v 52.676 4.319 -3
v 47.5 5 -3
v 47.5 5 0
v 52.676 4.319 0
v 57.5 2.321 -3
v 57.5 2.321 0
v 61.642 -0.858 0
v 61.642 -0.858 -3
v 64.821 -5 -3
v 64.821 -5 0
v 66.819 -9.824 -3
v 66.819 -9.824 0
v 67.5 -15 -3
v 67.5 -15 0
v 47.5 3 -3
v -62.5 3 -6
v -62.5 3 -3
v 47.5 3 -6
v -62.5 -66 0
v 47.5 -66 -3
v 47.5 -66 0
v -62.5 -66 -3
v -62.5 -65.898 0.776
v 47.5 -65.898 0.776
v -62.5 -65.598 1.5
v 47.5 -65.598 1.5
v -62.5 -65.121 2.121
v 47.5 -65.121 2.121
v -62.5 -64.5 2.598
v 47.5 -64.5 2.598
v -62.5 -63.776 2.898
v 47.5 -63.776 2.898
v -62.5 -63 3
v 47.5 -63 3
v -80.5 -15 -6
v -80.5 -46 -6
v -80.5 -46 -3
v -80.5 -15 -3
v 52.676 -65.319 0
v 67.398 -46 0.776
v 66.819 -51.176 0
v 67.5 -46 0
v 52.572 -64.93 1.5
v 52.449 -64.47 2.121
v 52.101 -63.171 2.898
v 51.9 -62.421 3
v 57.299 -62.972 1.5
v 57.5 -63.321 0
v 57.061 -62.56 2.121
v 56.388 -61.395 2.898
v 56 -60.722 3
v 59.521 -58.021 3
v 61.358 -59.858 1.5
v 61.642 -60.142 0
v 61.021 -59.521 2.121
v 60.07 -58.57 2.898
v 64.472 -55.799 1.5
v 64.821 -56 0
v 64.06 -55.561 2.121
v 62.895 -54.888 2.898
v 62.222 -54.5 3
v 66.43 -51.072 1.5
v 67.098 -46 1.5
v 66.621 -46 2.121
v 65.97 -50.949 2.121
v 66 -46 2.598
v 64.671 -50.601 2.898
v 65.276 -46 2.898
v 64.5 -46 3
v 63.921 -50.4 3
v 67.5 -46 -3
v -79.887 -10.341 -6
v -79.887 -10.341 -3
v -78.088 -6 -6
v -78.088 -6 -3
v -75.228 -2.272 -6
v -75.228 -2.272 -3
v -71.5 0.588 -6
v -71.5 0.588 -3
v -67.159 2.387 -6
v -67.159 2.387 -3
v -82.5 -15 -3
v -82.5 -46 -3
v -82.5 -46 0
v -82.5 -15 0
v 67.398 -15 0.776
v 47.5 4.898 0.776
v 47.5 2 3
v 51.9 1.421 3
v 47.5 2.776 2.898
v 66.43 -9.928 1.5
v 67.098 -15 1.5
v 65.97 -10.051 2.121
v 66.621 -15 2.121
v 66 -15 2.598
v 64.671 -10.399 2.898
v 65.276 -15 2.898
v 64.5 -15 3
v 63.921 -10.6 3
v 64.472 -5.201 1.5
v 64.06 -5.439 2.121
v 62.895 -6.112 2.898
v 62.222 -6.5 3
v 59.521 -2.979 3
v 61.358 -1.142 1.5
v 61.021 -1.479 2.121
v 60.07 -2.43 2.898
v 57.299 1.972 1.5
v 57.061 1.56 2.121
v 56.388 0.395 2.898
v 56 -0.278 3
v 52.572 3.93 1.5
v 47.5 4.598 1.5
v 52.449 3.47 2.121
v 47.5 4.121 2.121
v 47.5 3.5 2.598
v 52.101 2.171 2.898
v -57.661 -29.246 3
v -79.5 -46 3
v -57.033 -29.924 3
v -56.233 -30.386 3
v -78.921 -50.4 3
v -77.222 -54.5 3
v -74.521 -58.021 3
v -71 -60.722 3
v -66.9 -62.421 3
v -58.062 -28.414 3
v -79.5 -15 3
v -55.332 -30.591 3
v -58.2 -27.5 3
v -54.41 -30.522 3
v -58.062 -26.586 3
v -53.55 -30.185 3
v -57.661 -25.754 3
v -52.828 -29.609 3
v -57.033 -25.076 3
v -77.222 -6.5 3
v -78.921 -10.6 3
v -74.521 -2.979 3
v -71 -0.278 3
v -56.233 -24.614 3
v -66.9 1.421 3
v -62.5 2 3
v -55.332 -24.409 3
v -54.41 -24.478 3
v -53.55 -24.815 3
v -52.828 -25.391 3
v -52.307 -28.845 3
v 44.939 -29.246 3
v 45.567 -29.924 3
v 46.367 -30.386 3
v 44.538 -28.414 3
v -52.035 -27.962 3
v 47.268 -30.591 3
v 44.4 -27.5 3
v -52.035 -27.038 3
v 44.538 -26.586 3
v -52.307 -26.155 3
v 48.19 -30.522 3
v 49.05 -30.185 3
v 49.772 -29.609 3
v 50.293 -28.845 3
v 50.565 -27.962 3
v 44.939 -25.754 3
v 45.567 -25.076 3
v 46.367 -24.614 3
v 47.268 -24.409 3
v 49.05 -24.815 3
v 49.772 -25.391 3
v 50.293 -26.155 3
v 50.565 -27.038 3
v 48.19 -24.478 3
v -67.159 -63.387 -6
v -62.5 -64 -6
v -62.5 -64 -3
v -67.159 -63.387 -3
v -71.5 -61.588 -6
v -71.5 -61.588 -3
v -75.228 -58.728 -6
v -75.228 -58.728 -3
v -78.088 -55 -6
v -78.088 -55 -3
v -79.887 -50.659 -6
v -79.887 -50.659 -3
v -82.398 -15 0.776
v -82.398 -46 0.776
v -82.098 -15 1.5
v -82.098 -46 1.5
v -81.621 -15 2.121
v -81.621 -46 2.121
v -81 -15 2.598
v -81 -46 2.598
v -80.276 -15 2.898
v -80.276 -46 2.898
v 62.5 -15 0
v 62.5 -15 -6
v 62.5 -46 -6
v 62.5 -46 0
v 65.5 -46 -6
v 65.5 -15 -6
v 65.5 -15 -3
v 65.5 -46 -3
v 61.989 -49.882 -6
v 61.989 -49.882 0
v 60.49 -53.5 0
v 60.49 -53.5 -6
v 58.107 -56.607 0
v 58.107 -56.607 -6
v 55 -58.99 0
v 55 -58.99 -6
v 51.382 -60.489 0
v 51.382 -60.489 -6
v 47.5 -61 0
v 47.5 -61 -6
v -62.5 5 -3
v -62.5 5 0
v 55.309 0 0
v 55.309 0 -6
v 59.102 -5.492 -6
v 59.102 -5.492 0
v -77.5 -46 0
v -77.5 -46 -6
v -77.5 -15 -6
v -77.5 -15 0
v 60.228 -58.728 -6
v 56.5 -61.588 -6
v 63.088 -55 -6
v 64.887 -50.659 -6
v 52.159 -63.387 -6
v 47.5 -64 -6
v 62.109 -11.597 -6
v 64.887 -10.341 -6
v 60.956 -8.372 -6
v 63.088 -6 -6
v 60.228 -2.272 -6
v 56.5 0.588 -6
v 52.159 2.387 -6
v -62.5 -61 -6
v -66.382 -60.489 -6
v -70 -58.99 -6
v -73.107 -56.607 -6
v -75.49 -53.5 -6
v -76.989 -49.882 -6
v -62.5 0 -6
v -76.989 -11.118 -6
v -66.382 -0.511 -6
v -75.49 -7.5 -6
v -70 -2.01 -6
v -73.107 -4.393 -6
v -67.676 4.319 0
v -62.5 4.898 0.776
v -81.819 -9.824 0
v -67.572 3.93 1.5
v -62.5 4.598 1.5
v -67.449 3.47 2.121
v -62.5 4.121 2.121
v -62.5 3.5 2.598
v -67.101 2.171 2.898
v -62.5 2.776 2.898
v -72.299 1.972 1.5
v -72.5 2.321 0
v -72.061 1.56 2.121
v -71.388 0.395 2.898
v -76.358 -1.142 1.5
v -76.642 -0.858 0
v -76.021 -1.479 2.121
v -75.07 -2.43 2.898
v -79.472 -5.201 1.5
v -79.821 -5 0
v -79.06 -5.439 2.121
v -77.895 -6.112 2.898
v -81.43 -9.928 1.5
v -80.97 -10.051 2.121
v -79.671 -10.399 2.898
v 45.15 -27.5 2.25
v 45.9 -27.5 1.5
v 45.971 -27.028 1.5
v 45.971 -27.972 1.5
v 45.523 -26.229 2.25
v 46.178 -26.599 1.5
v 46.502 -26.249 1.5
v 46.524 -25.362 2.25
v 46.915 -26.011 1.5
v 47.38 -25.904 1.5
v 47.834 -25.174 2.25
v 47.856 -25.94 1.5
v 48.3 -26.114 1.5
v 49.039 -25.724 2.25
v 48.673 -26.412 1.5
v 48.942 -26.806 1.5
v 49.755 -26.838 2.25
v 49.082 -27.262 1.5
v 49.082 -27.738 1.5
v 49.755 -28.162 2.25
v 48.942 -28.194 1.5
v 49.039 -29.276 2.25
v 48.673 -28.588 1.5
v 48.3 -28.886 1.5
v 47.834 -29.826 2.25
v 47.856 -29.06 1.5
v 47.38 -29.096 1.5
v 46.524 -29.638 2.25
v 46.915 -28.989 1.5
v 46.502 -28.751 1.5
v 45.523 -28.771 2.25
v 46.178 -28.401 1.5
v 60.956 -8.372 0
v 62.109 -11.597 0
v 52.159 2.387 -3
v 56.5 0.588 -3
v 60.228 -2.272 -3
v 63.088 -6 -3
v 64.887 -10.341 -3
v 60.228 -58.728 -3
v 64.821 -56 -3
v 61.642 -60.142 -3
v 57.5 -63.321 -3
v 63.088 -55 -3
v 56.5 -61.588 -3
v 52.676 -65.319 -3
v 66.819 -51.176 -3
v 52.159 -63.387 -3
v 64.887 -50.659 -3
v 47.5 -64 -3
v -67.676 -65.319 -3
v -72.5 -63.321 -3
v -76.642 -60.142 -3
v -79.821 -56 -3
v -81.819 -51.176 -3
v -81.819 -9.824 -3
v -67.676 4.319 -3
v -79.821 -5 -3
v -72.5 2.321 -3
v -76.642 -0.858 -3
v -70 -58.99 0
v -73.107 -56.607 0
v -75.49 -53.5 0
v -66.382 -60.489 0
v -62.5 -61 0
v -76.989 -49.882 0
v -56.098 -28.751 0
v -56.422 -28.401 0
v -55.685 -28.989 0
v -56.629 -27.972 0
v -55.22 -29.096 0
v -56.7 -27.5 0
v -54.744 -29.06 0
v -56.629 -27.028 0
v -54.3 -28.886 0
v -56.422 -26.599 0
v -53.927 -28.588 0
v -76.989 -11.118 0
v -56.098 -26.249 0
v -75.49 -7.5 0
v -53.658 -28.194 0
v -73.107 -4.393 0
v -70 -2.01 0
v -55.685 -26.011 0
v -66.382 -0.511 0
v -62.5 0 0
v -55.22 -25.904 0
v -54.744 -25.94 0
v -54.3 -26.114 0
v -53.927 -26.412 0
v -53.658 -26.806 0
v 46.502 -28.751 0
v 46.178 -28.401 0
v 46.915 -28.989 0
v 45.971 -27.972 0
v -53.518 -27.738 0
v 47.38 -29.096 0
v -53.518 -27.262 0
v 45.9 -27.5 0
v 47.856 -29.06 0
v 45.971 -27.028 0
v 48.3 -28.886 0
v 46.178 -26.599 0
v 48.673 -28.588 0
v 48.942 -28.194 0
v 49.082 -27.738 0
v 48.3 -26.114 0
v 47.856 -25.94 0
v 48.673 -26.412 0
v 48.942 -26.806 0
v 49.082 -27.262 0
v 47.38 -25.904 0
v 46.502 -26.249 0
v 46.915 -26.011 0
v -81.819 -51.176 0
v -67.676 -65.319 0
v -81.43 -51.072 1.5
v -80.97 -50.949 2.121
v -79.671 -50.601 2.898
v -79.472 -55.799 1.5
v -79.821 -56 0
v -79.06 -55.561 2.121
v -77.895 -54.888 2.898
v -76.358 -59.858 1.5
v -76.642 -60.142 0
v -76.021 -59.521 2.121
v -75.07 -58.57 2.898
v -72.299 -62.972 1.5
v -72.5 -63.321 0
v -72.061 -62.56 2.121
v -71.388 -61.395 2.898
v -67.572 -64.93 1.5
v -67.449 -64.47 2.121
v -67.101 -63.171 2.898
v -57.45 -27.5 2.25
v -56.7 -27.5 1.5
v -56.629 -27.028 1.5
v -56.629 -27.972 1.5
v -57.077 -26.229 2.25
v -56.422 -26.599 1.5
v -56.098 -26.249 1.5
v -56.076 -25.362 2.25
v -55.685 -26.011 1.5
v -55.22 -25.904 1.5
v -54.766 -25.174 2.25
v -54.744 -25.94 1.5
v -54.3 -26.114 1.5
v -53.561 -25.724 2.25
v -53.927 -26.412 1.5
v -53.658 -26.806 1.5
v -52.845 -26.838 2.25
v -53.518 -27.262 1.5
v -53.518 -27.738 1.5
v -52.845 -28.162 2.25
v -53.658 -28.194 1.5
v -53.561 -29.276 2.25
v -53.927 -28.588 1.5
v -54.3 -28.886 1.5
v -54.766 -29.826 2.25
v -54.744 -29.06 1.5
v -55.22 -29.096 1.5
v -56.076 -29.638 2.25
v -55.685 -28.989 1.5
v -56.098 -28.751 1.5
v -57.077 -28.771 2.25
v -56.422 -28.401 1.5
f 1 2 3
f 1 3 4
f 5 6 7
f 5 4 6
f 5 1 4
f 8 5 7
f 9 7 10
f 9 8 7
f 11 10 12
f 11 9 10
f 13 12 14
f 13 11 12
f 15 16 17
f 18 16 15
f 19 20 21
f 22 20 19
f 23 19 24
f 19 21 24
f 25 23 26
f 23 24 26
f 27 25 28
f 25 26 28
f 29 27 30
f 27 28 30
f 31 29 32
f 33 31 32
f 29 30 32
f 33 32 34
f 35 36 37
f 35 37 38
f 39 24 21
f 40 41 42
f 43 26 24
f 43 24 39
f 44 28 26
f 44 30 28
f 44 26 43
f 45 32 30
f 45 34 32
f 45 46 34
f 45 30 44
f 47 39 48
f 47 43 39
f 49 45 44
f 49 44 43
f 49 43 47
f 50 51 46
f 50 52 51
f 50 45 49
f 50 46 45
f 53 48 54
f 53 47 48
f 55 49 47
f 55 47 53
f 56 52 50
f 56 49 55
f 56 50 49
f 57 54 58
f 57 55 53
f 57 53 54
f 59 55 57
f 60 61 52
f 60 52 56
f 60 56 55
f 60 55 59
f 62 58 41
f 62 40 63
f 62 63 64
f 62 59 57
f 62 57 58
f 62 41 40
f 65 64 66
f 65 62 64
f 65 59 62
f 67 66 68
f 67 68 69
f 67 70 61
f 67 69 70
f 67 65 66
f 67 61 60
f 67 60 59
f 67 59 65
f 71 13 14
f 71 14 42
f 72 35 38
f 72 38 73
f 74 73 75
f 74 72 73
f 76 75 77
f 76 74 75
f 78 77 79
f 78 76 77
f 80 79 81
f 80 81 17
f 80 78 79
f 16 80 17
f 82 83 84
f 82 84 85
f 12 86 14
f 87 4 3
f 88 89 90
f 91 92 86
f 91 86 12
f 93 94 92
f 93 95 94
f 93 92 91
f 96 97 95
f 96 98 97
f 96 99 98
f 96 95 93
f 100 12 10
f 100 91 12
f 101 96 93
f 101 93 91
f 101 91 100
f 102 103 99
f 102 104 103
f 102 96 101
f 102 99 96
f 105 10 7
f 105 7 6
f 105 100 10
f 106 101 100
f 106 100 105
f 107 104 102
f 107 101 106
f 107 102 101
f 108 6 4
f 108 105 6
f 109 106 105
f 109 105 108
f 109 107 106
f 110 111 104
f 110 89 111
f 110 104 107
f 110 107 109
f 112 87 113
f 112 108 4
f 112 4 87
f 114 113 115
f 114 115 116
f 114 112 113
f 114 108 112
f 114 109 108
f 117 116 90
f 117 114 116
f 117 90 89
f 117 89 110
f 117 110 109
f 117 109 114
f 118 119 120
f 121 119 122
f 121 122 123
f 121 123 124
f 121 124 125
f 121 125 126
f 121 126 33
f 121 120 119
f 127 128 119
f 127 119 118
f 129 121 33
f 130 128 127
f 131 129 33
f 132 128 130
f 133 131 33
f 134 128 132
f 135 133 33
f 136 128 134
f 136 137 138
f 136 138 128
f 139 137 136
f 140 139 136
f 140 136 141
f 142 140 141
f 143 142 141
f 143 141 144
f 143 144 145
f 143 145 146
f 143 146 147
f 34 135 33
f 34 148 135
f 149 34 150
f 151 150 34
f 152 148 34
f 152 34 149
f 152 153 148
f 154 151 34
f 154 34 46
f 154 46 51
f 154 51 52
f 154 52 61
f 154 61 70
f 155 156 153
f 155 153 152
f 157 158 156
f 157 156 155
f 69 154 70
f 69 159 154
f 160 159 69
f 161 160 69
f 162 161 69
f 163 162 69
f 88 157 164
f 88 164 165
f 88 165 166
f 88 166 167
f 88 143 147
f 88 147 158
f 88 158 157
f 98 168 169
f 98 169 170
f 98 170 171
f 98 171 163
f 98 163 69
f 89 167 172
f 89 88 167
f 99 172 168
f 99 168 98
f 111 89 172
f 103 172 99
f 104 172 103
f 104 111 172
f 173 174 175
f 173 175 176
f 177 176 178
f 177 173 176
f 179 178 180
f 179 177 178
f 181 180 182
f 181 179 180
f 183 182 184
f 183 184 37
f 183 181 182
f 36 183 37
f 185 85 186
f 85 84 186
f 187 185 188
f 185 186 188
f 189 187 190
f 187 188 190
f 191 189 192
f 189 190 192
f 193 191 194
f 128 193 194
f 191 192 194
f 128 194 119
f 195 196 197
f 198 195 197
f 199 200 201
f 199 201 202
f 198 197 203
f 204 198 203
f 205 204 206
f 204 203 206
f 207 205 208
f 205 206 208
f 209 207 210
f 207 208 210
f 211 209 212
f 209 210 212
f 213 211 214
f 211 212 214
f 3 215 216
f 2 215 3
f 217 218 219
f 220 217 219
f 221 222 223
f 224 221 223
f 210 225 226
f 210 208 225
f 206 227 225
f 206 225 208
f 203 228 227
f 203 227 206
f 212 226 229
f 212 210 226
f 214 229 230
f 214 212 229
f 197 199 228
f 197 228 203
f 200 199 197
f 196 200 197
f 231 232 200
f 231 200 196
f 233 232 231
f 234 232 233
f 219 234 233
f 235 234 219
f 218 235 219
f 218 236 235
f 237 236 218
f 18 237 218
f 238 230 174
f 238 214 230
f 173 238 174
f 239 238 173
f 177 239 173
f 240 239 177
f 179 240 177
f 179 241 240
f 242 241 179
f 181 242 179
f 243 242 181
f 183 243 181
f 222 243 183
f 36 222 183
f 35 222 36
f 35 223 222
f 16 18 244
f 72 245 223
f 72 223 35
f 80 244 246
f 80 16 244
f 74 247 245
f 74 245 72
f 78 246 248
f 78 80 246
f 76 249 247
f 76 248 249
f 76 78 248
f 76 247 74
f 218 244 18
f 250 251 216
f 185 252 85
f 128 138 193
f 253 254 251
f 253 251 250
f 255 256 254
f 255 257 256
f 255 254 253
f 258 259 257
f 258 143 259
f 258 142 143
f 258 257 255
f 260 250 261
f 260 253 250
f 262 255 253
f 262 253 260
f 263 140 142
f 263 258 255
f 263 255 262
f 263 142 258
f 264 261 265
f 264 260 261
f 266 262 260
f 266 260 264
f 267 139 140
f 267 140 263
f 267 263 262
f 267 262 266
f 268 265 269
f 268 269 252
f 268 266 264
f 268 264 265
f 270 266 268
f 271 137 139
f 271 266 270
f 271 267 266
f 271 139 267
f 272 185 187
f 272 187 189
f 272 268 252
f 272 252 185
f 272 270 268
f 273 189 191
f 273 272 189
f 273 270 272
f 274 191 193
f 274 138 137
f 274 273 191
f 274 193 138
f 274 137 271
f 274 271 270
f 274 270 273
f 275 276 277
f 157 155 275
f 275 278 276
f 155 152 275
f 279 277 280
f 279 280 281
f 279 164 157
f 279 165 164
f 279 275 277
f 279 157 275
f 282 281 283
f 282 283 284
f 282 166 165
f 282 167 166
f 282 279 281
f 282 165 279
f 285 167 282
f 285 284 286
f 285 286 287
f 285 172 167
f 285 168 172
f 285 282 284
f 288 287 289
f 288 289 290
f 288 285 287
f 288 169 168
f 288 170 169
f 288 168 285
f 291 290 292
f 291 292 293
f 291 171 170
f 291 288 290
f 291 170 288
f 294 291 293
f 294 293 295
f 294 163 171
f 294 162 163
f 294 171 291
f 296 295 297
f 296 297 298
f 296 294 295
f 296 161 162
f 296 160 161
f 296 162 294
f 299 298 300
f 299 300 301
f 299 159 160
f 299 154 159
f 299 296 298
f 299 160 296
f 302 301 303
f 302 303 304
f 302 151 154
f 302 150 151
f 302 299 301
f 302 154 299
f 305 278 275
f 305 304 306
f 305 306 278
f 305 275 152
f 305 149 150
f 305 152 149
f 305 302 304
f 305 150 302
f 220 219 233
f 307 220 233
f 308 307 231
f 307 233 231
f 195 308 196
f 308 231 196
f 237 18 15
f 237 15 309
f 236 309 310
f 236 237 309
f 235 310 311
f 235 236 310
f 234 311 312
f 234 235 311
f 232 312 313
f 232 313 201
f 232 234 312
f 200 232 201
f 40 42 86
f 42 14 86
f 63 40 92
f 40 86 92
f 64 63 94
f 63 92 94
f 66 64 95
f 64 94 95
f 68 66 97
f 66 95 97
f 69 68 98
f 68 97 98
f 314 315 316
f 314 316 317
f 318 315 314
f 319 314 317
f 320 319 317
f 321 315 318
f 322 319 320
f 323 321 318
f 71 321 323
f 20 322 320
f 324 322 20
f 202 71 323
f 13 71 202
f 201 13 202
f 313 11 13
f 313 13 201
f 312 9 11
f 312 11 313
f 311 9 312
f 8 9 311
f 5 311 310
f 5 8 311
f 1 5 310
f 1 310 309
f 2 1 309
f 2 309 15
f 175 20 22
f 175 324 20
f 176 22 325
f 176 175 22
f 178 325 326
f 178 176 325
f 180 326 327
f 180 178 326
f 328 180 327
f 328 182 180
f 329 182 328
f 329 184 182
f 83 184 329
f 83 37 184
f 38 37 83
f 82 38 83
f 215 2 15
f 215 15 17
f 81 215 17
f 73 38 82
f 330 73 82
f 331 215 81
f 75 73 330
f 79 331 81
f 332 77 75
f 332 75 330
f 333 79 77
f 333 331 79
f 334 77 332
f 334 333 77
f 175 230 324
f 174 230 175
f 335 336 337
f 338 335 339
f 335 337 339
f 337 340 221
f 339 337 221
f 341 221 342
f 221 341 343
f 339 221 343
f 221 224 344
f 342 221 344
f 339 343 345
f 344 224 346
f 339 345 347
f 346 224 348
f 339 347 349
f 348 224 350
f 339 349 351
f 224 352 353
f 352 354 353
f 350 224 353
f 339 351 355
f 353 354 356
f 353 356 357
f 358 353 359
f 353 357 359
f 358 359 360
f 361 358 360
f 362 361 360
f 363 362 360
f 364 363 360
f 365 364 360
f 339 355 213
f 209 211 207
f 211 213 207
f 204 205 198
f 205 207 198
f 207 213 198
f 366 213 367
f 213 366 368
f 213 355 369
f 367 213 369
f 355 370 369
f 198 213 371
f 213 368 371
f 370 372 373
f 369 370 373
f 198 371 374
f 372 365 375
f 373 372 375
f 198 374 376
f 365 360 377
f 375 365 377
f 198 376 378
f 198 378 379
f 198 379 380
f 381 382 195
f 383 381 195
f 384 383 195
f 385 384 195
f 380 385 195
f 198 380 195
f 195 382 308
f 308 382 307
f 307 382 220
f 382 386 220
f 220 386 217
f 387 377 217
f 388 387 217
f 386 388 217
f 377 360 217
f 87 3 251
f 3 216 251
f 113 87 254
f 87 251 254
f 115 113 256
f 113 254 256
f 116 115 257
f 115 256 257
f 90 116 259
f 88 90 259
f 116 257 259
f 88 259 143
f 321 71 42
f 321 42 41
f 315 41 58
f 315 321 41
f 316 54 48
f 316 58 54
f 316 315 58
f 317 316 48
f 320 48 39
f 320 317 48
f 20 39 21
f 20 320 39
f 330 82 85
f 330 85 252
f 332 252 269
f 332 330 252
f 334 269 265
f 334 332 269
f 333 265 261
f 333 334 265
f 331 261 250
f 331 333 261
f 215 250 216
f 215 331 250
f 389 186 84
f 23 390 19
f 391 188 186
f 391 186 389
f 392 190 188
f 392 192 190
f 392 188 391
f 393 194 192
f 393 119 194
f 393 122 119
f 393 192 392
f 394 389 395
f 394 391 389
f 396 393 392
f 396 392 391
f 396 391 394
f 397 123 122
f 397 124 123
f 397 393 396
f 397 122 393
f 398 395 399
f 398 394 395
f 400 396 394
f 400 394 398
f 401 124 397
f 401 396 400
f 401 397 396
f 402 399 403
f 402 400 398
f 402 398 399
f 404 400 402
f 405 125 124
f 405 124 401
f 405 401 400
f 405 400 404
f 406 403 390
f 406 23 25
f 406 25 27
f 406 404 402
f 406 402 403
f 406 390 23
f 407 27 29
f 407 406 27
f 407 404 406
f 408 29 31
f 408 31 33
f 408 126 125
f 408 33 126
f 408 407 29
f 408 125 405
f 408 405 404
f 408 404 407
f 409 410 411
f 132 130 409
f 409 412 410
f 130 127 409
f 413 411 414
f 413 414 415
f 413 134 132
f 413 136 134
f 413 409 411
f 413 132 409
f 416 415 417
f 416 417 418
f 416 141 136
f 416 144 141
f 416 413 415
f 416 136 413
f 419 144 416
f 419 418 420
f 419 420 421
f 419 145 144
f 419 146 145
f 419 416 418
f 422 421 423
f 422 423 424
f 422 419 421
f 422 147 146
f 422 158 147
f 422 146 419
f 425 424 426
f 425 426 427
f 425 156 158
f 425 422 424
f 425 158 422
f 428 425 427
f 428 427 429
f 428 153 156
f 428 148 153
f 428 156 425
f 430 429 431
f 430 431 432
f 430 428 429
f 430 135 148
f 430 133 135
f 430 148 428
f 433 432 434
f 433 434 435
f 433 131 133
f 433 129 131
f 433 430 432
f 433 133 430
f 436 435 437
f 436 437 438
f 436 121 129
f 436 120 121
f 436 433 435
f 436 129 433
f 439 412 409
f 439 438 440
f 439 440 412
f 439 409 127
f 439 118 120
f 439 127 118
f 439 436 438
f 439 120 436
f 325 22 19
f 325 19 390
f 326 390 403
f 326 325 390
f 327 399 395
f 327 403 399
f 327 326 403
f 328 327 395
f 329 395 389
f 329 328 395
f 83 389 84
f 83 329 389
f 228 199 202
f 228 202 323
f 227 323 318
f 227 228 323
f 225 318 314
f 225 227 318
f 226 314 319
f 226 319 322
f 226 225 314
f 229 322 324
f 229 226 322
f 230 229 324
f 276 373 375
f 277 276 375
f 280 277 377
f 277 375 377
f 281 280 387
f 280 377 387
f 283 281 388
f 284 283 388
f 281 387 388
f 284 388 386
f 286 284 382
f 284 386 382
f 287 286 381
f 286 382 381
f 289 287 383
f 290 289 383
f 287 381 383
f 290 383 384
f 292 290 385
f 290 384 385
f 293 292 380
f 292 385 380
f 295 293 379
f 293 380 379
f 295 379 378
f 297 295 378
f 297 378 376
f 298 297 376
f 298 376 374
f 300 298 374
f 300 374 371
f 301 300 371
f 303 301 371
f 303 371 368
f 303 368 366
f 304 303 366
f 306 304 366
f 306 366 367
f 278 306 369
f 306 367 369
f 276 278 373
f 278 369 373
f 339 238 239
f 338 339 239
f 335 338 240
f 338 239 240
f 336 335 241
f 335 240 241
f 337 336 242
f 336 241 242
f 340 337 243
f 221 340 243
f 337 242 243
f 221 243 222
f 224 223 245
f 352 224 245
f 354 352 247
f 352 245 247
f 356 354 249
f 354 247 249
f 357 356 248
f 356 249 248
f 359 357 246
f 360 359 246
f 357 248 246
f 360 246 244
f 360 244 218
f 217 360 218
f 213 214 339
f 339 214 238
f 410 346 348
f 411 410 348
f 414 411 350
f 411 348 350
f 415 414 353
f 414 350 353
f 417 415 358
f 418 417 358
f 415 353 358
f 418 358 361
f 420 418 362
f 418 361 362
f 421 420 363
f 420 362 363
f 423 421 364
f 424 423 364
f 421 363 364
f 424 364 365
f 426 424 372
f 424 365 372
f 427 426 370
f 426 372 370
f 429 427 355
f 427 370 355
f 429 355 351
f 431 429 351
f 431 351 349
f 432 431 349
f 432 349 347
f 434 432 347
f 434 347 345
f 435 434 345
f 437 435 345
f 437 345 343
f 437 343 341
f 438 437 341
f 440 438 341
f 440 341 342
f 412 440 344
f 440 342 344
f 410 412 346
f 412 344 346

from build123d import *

# Parameters (mm, degrees)
BOSS_EXTRUDE1_DEPTH = 3
BOSS_EXTRUDE2_START = 3
BOSS_EXTRUDE2_DEPTH = 3
FILLET1_R           = 3
BOSS_EXTRUDE3_START = 6
BOSS_EXTRUDE3_DEPTH = 6
SKETCH4_R           = 1.6
CUT_EXTRUDE1_DEPTH  = 3
CHAMFER1_SIZE       = 1.5
CUT_EXTRUDE2_DEPTH  = 6


with BuildPart() as part:
    # Sketch1 → Boss-Extrude1 (new body)
    with BuildSketch(Plane.XY):
        with BuildLine():
            Line((67.5, -46), (67.5, -15))
            ThreePointArc((67.5, -15), (61.642135624, -0.857864376), (47.5, 5))
            Line((47.5, 5), (-62.5, 5))
            ThreePointArc((-62.5, 5), (-76.642135624, -0.857864376), (-82.5, -15))
            Line((-82.5, -15), (-82.5, -46))
            ThreePointArc((-82.5, -46), (-76.642135624, -60.142135624), (-62.5, -66))
            Line((-62.5, -66), (47.5, -66))
            ThreePointArc((47.5, -66), (61.642135624, -60.142135624), (67.5, -46))
        make_face()
    extrude(amount=BOSS_EXTRUDE1_DEPTH)

    # Sketch2 → Boss-Extrude2 (add)
    with BuildSketch(Plane(origin=(0, 0, 0), x_dir=(-1, 0, 0), z_dir=(0, 0, -1)).offset(BOSS_EXTRUDE2_START)):
        with BuildLine():
            Line((-47.5, -66), (62.5, -66))
            ThreePointArc((62.5, -66), (76.642135624, -60.142135624), (82.5, -46))
            Line((82.5, -46), (82.5, -15))
            ThreePointArc((82.5, -15), (76.642135624, -0.857864376), (62.5, 5))
            Line((62.5, 5), (-47.5, 5))
            ThreePointArc((-47.5, 5), (-61.642135624, -0.857864376), (-67.5, -15))
            Line((-67.5, -15), (-67.5, -46))
            ThreePointArc((-67.5, -46), (-61.642135624, -60.142135624), (-47.5, -66))
        make_face()
        with BuildLine():
            Line((-47.5, -64), (62.5, -64))
            ThreePointArc((62.5, -64), (75.227922061, -58.727922061), (80.5, -46))
            Line((80.5, -46), (80.5, -15))
            ThreePointArc((80.5, -15), (75.227922061, -2.272077939), (62.5, 3))
            Line((62.5, 3), (-47.5, 3))
            ThreePointArc((-47.5, 3), (-60.227922061, -2.272077939), (-65.5, -15))
            Line((-65.5, -15), (-65.5, -46))
            ThreePointArc((-65.5, -46), (-60.227922061, -58.727922061), (-47.5, -64))
        make_face(mode=Mode.SUBTRACT)
    extrude(amount=-BOSS_EXTRUDE2_DEPTH)

    # Fillet1
    fillet1_edges = [part.edges().sort_by_distance(p)[0] for p in [
        (61.642135624, -0.857864376, 3),
        (-7.5, 5, 3),
        (-76.642135624, -0.857864376, 3),
        (-82.5, -30.5, 3),
        (-76.642135624, -60.142135624, 3),
        (-7.5, -66, 3),
        (61.642135624, -60.142135624, 3),
        (67.5, -30.5, 3),
    ]]
    fillet(fillet1_edges, radius=FILLET1_R)

    # Sketch3 → Boss-Extrude3 (add)
    with BuildSketch(Plane(origin=(0, 0, 0), x_dir=(-1, 0, 0), z_dir=(0, 0, -1)).offset(BOSS_EXTRUDE3_START)):
        with BuildLine():
            Line((-65.5, -15), (-65.5, -46))
            ThreePointArc((-65.5, -46), (-60.227922061, -58.727922061), (-47.5, -64))
            Line((-47.5, -64), (62.5, -64))
            ThreePointArc((62.5, -64), (75.227922061, -58.727922061), (80.5, -46))
            Line((80.5, -46), (80.5, -15))
            ThreePointArc((80.5, -15), (75.227922061, -2.272077939), (62.5, 3))
            Line((62.5, 3), (-47.5, 3))
            ThreePointArc((-47.5, 3), (-60.227922061, -2.272077939), (-65.5, -15))
        make_face()
        with BuildLine():
            Line((-62.5, -15), (-62.5, -46))
            ThreePointArc((-62.5, -46), (-58.106601718, -56.606601718), (-47.5, -61))
            Line((-47.5, -61), (62.5, -61))
            ThreePointArc((62.5, -61), (73.106601718, -56.606601718), (77.5, -46))
            Line((77.5, -46), (77.5, -15))
            ThreePointArc((77.5, -15), (73.106601718, -4.393398282), (62.5, 0))
            Line((62.5, 0), (-47.5, 0))
            ThreePointArc((-47.5, 0), (-58.106601718, -4.393398282), (-62.5, -15))
        make_face(mode=Mode.SUBTRACT)
    extrude(amount=-BOSS_EXTRUDE3_DEPTH)

    # Sketch4 → Cut-Extrude1 (cut)
    with BuildSketch(Plane(origin=(0, 0, 0), x_dir=(-1, 0, 0), z_dir=(0, 0, -1))):
        with Locations((-47.5, -27.5)):
            Circle(SKETCH4_R)
        with Locations((55.1, -27.5)):
            Circle(SKETCH4_R)
    extrude(amount=-CUT_EXTRUDE1_DEPTH, mode=Mode.SUBTRACT)

    # Chamfer1
    chamfer1_edges = [part.edges().sort_by_distance(p)[0] for p in [
        (49.1, -27.5, 3),
        (-53.5, -27.5, 3),
    ]]
    chamfer(chamfer1_edges, length=CHAMFER1_SIZE)

    # Sketch5 → Cut-Extrude2 (cut)
    with BuildSketch(Plane(origin=(0, 0, -6), x_dir=(-1, 0, 0), z_dir=(0, 0, -1))):
        Polygon((-44.433816438, 0), (-55.308762061, 0), (-60.500068825, -7.51680479), align=None)
    extrude(amount=-CUT_EXTRUDE2_DEPTH, mode=Mode.SUBTRACT)


solid = part.part
